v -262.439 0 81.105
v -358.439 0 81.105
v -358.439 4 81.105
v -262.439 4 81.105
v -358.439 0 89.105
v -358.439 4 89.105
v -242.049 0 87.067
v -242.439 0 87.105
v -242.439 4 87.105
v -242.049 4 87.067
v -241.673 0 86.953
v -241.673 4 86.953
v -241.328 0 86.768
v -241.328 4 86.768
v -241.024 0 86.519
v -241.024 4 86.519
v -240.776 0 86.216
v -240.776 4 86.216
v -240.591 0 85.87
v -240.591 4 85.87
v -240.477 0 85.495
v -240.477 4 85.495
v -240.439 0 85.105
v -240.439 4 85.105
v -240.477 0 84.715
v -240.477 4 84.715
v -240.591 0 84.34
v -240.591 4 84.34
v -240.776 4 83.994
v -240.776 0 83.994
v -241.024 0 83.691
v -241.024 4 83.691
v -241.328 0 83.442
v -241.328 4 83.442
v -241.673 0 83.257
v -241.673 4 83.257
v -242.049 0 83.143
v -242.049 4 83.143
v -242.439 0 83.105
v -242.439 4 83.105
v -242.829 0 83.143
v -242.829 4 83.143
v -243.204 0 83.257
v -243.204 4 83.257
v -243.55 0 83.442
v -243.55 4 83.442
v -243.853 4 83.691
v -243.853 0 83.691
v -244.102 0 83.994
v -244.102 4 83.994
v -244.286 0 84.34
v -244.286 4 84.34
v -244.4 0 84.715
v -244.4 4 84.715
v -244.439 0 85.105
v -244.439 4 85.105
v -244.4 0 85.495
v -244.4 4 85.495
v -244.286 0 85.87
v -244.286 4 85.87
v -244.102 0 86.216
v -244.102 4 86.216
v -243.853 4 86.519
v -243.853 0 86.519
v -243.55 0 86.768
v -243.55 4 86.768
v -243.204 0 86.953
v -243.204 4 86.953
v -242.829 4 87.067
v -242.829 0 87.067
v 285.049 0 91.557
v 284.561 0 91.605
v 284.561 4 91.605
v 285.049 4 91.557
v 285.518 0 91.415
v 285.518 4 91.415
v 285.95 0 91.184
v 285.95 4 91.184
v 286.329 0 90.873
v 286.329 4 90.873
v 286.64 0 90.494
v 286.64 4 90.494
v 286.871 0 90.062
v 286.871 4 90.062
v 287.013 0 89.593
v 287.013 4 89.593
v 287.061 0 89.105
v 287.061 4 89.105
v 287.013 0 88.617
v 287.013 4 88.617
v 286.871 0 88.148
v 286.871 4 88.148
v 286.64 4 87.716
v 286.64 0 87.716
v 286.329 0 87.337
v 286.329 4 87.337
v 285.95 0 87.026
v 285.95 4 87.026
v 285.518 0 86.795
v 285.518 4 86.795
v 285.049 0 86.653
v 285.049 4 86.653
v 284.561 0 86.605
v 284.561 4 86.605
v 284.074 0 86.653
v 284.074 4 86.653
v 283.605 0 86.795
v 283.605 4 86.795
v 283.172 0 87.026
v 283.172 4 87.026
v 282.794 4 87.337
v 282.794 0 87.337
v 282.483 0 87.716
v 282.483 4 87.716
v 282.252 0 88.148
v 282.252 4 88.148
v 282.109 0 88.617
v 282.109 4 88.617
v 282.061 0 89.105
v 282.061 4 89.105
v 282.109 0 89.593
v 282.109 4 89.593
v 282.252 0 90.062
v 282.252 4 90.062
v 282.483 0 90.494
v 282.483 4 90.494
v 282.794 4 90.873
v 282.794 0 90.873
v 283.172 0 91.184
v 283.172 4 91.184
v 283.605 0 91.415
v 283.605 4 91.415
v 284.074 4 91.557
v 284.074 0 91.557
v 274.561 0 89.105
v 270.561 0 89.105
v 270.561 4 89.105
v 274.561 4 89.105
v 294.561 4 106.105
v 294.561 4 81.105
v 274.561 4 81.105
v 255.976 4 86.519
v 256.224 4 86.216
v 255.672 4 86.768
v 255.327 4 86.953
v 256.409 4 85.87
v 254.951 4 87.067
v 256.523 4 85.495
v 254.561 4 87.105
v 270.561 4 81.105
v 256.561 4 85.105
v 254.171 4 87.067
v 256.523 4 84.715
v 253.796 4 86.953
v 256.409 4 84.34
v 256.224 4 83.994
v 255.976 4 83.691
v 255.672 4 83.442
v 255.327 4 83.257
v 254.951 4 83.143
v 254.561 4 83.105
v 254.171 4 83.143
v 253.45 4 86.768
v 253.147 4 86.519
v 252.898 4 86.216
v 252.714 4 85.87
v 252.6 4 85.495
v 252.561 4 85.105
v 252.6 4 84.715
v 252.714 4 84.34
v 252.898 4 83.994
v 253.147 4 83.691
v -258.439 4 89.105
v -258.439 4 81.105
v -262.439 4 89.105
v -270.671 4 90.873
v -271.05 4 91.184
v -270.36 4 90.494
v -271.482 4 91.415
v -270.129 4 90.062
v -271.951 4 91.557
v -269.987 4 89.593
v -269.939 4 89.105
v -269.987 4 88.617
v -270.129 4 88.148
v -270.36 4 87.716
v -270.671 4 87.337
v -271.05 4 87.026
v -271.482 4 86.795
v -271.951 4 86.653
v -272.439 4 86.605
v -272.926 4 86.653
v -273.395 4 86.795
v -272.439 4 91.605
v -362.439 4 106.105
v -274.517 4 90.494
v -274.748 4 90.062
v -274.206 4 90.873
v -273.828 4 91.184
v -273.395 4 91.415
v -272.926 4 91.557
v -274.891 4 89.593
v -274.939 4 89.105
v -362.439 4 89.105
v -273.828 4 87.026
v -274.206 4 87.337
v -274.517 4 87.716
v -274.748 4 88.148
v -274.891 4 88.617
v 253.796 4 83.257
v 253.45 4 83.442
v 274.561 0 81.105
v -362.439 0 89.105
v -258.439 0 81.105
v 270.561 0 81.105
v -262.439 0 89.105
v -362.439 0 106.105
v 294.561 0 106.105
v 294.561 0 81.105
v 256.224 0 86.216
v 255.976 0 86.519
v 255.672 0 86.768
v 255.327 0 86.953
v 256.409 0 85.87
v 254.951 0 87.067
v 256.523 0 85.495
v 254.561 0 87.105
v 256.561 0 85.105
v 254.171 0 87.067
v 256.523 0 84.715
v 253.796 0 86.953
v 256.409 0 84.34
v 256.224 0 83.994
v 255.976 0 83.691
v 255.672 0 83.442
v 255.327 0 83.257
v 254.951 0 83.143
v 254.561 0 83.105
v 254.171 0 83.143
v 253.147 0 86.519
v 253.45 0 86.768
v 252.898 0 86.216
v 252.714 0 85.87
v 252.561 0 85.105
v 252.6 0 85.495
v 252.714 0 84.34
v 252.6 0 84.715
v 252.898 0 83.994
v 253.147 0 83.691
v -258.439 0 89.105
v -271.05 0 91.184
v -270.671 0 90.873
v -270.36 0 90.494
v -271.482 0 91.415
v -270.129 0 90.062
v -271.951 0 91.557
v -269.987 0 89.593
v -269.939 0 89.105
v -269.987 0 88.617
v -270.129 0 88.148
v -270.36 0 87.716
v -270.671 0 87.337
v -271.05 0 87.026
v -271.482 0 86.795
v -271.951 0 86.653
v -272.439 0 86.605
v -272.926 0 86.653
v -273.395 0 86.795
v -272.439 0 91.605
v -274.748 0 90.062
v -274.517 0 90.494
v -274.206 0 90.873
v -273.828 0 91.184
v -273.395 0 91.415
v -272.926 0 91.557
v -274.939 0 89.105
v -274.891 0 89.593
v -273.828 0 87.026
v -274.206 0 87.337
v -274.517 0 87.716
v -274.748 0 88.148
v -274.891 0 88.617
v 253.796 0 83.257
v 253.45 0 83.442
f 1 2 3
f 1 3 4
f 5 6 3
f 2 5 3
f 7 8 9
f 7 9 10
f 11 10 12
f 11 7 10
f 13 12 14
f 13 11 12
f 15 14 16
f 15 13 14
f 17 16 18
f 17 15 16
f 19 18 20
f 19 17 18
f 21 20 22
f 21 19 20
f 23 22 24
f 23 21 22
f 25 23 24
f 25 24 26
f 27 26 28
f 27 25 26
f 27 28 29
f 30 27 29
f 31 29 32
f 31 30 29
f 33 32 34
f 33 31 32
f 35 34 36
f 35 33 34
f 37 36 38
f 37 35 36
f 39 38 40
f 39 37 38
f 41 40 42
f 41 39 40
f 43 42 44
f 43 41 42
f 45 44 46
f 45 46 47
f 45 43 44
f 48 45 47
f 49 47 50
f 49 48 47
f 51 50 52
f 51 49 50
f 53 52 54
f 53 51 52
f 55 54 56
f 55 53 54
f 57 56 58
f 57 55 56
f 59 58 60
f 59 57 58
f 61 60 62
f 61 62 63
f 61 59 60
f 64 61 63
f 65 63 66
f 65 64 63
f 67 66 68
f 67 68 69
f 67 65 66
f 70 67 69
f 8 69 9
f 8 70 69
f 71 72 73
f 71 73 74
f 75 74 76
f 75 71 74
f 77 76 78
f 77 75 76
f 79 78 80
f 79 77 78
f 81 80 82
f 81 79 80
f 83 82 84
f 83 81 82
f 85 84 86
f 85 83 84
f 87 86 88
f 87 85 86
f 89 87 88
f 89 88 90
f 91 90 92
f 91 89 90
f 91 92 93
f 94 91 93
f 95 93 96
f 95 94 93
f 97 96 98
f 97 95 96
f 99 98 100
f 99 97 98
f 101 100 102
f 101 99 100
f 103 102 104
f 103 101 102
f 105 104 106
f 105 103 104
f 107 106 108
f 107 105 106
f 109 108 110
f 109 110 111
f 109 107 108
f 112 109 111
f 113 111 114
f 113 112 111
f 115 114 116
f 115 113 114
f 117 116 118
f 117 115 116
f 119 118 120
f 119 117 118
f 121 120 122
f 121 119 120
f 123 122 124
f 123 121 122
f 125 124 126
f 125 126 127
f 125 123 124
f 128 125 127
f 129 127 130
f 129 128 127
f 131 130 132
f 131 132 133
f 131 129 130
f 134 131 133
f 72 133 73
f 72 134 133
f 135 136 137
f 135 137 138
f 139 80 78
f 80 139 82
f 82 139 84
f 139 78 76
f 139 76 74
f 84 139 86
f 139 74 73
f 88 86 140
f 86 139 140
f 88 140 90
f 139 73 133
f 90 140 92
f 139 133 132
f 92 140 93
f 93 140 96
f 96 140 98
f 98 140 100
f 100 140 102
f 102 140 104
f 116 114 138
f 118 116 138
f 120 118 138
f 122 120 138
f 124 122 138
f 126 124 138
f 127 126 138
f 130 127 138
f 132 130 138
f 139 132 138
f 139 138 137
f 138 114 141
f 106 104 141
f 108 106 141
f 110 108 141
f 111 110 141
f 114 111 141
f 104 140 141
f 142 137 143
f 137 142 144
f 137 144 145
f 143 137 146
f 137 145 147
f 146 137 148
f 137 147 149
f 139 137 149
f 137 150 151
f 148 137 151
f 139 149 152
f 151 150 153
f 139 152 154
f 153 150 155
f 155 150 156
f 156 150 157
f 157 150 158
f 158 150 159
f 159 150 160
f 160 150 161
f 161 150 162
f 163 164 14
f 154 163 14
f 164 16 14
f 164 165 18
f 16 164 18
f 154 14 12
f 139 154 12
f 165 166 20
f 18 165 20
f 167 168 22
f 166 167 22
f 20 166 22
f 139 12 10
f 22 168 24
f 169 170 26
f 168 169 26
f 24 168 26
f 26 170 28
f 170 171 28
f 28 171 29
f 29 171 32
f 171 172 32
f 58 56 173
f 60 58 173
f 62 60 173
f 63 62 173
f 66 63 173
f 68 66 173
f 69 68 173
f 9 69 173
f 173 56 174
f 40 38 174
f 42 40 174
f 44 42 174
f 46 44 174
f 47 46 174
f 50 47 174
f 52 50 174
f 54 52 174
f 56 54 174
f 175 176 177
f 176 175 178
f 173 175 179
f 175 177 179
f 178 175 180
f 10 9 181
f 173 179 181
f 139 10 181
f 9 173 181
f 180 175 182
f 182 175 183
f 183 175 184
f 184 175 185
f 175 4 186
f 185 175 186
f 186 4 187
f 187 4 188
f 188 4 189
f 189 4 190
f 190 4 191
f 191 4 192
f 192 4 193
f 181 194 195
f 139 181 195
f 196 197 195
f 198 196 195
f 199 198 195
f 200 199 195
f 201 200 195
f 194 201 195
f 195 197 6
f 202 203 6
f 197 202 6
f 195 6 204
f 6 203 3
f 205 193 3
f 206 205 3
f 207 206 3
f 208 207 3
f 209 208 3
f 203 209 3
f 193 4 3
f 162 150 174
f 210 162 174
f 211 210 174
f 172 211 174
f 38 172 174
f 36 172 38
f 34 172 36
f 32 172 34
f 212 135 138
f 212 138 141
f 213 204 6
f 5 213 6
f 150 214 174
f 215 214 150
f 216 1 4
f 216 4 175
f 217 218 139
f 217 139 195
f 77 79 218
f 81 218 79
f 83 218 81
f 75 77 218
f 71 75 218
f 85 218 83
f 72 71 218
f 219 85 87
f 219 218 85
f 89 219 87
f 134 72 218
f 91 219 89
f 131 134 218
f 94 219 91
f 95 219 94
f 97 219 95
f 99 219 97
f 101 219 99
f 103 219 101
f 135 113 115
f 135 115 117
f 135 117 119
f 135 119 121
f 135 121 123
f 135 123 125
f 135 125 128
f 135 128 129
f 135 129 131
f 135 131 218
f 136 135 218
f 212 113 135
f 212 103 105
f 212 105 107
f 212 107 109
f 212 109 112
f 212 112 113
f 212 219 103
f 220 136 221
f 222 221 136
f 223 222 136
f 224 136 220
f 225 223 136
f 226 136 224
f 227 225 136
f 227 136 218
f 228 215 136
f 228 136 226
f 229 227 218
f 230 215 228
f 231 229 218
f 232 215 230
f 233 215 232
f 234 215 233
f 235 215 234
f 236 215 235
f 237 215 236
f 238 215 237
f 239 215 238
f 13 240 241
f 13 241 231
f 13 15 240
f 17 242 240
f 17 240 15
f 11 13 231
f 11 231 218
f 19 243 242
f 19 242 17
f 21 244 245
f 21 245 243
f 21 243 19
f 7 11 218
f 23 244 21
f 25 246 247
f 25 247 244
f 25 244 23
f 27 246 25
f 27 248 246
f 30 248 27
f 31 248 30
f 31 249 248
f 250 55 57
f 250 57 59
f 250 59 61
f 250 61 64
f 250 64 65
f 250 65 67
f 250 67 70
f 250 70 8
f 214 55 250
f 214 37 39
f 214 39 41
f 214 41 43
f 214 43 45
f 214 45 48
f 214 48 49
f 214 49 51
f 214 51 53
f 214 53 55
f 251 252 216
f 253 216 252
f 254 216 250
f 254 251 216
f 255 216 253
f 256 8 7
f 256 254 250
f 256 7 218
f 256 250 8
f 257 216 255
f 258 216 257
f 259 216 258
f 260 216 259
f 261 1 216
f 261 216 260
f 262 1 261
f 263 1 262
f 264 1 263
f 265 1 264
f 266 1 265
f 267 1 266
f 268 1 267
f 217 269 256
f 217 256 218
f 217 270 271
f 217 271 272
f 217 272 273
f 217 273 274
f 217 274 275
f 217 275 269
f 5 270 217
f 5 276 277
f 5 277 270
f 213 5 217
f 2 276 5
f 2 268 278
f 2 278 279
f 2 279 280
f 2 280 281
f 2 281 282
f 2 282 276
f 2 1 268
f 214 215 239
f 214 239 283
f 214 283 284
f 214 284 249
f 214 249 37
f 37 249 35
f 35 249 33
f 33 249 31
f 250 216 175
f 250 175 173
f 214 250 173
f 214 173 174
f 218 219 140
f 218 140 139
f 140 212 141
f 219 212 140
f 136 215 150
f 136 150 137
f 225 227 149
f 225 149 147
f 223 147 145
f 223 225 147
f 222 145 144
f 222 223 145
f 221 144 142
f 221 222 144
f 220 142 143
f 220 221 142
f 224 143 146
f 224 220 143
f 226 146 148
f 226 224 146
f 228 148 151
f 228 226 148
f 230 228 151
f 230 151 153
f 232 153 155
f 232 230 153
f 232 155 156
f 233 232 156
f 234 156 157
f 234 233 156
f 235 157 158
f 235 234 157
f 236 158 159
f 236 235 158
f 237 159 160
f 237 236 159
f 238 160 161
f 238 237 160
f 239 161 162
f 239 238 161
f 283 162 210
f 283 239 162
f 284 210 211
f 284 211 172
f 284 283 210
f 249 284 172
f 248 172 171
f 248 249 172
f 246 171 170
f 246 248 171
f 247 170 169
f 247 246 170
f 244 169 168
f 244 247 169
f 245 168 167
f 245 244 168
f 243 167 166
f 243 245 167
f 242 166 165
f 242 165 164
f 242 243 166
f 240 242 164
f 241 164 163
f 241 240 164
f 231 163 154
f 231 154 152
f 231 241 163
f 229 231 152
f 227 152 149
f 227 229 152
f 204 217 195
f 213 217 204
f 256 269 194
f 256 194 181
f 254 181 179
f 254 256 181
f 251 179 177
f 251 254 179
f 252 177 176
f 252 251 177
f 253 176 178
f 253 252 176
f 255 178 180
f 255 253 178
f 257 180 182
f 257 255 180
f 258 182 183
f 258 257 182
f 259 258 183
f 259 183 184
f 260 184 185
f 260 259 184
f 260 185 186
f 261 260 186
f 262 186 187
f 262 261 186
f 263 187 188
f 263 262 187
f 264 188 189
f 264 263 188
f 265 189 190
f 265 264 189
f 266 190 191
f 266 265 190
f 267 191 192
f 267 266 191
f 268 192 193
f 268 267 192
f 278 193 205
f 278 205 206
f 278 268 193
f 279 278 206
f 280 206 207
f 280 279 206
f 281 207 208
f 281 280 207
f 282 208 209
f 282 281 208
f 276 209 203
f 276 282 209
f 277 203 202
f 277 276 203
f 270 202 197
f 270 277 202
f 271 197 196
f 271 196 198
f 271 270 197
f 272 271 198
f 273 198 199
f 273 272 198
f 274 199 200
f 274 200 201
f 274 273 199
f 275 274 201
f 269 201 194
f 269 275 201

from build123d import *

# Parameters (mm, degrees)
SKETCH2_R           = 2.5
SKETCH2_R_2         = 2
BOSS_EXTRUDE2_DEPTH = 4
SKETCH3_W           = 4
SKETCH3_H           = 8
CUT_EXTRUDE1_DEPTH  = 4


with BuildPart() as part:
    # Sketch2 → Boss-Extrude2 (new body)
    with BuildSketch(Plane(origin=(0, 0, 0), x_dir=(1, 0, 0), z_dir=(0, 1, 0))):
        Polygon((-362.438698088, -81.105028172), (-262.438698088, -81.105028172), (-262.438698088, -89.105028172), (-258.438698088, -89.105028172), (-258.438698088, -81.105028172), (270.561301912, -81.105028172), (270.561301912, -89.105028172), (274.561301912, -89.105028172), (274.561301912, -81.105028172), (294.561301912, -81.105028172), (294.561301912, -106.105028172), (-362.438698088, -106.105028172), align=None)
        with Locations(Location((284.561301912, -89.105028172, 0), (0, 0, 270))):
            Circle(SKETCH2_R, mode=Mode.SUBTRACT)
        with Locations(Location((-272.438698088, -89.105028172, 0), (0, 0, 270))):
            Circle(SKETCH2_R, mode=Mode.SUBTRACT)
        with Locations(Location((254.561301912, -85.105028172, 0), (0, 0, 270))):
            Circle(SKETCH2_R_2, mode=Mode.SUBTRACT)
        with Locations(Location((-242.438698088, -85.105028172, 0), (0, 0, 270))):
            Circle(SKETCH2_R_2, mode=Mode.SUBTRACT)
    extrude(amount=BOSS_EXTRUDE2_DEPTH)

    # Sketch3 → Cut-Extrude1 (cut)
    with BuildSketch(Plane(origin=(0, 4, 0), x_dir=(1, 0, 0), z_dir=(0, 1, 0))):
        with Locations((-360.438698088, -85.105028172)):
            Rectangle(SKETCH3_W, SKETCH3_H)
    extrude(amount=-CUT_EXTRUDE1_DEPTH, mode=Mode.SUBTRACT)


solid = part.part
